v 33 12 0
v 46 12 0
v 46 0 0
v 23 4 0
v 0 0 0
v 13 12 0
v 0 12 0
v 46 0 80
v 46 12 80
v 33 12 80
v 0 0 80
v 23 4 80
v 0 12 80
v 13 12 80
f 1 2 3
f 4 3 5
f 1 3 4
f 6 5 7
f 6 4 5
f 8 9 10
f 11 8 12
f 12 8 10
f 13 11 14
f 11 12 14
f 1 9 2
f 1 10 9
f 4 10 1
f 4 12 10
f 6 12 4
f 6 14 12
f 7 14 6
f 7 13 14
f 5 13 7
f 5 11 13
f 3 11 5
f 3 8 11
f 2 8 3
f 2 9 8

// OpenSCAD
$fn = 32;

// ----------------------------------------------------------------------
// V guide rail: vway, 46 mm wide
// ----------------------------------------------------------------------

// --- parameters (mm) ---
rail_w = 46;              // rail width, X
base_t = 12;              // base plate thickness
v_depth = 8;              // V feature depth / height
v_half_w = 10;            // half width of the V at the base face
plate_t = 80;             // rail length, Z (the extrusion height)

profile = [[0, 0], [46, 0], [46, 12], [33, 12], [23, 4], [13, 12], [0, 12]];  // primary outline, 7 points, counter clockwise

// --- the one profile operation ---
linear_extrude(height = plate_t) polygon(points = profile);
